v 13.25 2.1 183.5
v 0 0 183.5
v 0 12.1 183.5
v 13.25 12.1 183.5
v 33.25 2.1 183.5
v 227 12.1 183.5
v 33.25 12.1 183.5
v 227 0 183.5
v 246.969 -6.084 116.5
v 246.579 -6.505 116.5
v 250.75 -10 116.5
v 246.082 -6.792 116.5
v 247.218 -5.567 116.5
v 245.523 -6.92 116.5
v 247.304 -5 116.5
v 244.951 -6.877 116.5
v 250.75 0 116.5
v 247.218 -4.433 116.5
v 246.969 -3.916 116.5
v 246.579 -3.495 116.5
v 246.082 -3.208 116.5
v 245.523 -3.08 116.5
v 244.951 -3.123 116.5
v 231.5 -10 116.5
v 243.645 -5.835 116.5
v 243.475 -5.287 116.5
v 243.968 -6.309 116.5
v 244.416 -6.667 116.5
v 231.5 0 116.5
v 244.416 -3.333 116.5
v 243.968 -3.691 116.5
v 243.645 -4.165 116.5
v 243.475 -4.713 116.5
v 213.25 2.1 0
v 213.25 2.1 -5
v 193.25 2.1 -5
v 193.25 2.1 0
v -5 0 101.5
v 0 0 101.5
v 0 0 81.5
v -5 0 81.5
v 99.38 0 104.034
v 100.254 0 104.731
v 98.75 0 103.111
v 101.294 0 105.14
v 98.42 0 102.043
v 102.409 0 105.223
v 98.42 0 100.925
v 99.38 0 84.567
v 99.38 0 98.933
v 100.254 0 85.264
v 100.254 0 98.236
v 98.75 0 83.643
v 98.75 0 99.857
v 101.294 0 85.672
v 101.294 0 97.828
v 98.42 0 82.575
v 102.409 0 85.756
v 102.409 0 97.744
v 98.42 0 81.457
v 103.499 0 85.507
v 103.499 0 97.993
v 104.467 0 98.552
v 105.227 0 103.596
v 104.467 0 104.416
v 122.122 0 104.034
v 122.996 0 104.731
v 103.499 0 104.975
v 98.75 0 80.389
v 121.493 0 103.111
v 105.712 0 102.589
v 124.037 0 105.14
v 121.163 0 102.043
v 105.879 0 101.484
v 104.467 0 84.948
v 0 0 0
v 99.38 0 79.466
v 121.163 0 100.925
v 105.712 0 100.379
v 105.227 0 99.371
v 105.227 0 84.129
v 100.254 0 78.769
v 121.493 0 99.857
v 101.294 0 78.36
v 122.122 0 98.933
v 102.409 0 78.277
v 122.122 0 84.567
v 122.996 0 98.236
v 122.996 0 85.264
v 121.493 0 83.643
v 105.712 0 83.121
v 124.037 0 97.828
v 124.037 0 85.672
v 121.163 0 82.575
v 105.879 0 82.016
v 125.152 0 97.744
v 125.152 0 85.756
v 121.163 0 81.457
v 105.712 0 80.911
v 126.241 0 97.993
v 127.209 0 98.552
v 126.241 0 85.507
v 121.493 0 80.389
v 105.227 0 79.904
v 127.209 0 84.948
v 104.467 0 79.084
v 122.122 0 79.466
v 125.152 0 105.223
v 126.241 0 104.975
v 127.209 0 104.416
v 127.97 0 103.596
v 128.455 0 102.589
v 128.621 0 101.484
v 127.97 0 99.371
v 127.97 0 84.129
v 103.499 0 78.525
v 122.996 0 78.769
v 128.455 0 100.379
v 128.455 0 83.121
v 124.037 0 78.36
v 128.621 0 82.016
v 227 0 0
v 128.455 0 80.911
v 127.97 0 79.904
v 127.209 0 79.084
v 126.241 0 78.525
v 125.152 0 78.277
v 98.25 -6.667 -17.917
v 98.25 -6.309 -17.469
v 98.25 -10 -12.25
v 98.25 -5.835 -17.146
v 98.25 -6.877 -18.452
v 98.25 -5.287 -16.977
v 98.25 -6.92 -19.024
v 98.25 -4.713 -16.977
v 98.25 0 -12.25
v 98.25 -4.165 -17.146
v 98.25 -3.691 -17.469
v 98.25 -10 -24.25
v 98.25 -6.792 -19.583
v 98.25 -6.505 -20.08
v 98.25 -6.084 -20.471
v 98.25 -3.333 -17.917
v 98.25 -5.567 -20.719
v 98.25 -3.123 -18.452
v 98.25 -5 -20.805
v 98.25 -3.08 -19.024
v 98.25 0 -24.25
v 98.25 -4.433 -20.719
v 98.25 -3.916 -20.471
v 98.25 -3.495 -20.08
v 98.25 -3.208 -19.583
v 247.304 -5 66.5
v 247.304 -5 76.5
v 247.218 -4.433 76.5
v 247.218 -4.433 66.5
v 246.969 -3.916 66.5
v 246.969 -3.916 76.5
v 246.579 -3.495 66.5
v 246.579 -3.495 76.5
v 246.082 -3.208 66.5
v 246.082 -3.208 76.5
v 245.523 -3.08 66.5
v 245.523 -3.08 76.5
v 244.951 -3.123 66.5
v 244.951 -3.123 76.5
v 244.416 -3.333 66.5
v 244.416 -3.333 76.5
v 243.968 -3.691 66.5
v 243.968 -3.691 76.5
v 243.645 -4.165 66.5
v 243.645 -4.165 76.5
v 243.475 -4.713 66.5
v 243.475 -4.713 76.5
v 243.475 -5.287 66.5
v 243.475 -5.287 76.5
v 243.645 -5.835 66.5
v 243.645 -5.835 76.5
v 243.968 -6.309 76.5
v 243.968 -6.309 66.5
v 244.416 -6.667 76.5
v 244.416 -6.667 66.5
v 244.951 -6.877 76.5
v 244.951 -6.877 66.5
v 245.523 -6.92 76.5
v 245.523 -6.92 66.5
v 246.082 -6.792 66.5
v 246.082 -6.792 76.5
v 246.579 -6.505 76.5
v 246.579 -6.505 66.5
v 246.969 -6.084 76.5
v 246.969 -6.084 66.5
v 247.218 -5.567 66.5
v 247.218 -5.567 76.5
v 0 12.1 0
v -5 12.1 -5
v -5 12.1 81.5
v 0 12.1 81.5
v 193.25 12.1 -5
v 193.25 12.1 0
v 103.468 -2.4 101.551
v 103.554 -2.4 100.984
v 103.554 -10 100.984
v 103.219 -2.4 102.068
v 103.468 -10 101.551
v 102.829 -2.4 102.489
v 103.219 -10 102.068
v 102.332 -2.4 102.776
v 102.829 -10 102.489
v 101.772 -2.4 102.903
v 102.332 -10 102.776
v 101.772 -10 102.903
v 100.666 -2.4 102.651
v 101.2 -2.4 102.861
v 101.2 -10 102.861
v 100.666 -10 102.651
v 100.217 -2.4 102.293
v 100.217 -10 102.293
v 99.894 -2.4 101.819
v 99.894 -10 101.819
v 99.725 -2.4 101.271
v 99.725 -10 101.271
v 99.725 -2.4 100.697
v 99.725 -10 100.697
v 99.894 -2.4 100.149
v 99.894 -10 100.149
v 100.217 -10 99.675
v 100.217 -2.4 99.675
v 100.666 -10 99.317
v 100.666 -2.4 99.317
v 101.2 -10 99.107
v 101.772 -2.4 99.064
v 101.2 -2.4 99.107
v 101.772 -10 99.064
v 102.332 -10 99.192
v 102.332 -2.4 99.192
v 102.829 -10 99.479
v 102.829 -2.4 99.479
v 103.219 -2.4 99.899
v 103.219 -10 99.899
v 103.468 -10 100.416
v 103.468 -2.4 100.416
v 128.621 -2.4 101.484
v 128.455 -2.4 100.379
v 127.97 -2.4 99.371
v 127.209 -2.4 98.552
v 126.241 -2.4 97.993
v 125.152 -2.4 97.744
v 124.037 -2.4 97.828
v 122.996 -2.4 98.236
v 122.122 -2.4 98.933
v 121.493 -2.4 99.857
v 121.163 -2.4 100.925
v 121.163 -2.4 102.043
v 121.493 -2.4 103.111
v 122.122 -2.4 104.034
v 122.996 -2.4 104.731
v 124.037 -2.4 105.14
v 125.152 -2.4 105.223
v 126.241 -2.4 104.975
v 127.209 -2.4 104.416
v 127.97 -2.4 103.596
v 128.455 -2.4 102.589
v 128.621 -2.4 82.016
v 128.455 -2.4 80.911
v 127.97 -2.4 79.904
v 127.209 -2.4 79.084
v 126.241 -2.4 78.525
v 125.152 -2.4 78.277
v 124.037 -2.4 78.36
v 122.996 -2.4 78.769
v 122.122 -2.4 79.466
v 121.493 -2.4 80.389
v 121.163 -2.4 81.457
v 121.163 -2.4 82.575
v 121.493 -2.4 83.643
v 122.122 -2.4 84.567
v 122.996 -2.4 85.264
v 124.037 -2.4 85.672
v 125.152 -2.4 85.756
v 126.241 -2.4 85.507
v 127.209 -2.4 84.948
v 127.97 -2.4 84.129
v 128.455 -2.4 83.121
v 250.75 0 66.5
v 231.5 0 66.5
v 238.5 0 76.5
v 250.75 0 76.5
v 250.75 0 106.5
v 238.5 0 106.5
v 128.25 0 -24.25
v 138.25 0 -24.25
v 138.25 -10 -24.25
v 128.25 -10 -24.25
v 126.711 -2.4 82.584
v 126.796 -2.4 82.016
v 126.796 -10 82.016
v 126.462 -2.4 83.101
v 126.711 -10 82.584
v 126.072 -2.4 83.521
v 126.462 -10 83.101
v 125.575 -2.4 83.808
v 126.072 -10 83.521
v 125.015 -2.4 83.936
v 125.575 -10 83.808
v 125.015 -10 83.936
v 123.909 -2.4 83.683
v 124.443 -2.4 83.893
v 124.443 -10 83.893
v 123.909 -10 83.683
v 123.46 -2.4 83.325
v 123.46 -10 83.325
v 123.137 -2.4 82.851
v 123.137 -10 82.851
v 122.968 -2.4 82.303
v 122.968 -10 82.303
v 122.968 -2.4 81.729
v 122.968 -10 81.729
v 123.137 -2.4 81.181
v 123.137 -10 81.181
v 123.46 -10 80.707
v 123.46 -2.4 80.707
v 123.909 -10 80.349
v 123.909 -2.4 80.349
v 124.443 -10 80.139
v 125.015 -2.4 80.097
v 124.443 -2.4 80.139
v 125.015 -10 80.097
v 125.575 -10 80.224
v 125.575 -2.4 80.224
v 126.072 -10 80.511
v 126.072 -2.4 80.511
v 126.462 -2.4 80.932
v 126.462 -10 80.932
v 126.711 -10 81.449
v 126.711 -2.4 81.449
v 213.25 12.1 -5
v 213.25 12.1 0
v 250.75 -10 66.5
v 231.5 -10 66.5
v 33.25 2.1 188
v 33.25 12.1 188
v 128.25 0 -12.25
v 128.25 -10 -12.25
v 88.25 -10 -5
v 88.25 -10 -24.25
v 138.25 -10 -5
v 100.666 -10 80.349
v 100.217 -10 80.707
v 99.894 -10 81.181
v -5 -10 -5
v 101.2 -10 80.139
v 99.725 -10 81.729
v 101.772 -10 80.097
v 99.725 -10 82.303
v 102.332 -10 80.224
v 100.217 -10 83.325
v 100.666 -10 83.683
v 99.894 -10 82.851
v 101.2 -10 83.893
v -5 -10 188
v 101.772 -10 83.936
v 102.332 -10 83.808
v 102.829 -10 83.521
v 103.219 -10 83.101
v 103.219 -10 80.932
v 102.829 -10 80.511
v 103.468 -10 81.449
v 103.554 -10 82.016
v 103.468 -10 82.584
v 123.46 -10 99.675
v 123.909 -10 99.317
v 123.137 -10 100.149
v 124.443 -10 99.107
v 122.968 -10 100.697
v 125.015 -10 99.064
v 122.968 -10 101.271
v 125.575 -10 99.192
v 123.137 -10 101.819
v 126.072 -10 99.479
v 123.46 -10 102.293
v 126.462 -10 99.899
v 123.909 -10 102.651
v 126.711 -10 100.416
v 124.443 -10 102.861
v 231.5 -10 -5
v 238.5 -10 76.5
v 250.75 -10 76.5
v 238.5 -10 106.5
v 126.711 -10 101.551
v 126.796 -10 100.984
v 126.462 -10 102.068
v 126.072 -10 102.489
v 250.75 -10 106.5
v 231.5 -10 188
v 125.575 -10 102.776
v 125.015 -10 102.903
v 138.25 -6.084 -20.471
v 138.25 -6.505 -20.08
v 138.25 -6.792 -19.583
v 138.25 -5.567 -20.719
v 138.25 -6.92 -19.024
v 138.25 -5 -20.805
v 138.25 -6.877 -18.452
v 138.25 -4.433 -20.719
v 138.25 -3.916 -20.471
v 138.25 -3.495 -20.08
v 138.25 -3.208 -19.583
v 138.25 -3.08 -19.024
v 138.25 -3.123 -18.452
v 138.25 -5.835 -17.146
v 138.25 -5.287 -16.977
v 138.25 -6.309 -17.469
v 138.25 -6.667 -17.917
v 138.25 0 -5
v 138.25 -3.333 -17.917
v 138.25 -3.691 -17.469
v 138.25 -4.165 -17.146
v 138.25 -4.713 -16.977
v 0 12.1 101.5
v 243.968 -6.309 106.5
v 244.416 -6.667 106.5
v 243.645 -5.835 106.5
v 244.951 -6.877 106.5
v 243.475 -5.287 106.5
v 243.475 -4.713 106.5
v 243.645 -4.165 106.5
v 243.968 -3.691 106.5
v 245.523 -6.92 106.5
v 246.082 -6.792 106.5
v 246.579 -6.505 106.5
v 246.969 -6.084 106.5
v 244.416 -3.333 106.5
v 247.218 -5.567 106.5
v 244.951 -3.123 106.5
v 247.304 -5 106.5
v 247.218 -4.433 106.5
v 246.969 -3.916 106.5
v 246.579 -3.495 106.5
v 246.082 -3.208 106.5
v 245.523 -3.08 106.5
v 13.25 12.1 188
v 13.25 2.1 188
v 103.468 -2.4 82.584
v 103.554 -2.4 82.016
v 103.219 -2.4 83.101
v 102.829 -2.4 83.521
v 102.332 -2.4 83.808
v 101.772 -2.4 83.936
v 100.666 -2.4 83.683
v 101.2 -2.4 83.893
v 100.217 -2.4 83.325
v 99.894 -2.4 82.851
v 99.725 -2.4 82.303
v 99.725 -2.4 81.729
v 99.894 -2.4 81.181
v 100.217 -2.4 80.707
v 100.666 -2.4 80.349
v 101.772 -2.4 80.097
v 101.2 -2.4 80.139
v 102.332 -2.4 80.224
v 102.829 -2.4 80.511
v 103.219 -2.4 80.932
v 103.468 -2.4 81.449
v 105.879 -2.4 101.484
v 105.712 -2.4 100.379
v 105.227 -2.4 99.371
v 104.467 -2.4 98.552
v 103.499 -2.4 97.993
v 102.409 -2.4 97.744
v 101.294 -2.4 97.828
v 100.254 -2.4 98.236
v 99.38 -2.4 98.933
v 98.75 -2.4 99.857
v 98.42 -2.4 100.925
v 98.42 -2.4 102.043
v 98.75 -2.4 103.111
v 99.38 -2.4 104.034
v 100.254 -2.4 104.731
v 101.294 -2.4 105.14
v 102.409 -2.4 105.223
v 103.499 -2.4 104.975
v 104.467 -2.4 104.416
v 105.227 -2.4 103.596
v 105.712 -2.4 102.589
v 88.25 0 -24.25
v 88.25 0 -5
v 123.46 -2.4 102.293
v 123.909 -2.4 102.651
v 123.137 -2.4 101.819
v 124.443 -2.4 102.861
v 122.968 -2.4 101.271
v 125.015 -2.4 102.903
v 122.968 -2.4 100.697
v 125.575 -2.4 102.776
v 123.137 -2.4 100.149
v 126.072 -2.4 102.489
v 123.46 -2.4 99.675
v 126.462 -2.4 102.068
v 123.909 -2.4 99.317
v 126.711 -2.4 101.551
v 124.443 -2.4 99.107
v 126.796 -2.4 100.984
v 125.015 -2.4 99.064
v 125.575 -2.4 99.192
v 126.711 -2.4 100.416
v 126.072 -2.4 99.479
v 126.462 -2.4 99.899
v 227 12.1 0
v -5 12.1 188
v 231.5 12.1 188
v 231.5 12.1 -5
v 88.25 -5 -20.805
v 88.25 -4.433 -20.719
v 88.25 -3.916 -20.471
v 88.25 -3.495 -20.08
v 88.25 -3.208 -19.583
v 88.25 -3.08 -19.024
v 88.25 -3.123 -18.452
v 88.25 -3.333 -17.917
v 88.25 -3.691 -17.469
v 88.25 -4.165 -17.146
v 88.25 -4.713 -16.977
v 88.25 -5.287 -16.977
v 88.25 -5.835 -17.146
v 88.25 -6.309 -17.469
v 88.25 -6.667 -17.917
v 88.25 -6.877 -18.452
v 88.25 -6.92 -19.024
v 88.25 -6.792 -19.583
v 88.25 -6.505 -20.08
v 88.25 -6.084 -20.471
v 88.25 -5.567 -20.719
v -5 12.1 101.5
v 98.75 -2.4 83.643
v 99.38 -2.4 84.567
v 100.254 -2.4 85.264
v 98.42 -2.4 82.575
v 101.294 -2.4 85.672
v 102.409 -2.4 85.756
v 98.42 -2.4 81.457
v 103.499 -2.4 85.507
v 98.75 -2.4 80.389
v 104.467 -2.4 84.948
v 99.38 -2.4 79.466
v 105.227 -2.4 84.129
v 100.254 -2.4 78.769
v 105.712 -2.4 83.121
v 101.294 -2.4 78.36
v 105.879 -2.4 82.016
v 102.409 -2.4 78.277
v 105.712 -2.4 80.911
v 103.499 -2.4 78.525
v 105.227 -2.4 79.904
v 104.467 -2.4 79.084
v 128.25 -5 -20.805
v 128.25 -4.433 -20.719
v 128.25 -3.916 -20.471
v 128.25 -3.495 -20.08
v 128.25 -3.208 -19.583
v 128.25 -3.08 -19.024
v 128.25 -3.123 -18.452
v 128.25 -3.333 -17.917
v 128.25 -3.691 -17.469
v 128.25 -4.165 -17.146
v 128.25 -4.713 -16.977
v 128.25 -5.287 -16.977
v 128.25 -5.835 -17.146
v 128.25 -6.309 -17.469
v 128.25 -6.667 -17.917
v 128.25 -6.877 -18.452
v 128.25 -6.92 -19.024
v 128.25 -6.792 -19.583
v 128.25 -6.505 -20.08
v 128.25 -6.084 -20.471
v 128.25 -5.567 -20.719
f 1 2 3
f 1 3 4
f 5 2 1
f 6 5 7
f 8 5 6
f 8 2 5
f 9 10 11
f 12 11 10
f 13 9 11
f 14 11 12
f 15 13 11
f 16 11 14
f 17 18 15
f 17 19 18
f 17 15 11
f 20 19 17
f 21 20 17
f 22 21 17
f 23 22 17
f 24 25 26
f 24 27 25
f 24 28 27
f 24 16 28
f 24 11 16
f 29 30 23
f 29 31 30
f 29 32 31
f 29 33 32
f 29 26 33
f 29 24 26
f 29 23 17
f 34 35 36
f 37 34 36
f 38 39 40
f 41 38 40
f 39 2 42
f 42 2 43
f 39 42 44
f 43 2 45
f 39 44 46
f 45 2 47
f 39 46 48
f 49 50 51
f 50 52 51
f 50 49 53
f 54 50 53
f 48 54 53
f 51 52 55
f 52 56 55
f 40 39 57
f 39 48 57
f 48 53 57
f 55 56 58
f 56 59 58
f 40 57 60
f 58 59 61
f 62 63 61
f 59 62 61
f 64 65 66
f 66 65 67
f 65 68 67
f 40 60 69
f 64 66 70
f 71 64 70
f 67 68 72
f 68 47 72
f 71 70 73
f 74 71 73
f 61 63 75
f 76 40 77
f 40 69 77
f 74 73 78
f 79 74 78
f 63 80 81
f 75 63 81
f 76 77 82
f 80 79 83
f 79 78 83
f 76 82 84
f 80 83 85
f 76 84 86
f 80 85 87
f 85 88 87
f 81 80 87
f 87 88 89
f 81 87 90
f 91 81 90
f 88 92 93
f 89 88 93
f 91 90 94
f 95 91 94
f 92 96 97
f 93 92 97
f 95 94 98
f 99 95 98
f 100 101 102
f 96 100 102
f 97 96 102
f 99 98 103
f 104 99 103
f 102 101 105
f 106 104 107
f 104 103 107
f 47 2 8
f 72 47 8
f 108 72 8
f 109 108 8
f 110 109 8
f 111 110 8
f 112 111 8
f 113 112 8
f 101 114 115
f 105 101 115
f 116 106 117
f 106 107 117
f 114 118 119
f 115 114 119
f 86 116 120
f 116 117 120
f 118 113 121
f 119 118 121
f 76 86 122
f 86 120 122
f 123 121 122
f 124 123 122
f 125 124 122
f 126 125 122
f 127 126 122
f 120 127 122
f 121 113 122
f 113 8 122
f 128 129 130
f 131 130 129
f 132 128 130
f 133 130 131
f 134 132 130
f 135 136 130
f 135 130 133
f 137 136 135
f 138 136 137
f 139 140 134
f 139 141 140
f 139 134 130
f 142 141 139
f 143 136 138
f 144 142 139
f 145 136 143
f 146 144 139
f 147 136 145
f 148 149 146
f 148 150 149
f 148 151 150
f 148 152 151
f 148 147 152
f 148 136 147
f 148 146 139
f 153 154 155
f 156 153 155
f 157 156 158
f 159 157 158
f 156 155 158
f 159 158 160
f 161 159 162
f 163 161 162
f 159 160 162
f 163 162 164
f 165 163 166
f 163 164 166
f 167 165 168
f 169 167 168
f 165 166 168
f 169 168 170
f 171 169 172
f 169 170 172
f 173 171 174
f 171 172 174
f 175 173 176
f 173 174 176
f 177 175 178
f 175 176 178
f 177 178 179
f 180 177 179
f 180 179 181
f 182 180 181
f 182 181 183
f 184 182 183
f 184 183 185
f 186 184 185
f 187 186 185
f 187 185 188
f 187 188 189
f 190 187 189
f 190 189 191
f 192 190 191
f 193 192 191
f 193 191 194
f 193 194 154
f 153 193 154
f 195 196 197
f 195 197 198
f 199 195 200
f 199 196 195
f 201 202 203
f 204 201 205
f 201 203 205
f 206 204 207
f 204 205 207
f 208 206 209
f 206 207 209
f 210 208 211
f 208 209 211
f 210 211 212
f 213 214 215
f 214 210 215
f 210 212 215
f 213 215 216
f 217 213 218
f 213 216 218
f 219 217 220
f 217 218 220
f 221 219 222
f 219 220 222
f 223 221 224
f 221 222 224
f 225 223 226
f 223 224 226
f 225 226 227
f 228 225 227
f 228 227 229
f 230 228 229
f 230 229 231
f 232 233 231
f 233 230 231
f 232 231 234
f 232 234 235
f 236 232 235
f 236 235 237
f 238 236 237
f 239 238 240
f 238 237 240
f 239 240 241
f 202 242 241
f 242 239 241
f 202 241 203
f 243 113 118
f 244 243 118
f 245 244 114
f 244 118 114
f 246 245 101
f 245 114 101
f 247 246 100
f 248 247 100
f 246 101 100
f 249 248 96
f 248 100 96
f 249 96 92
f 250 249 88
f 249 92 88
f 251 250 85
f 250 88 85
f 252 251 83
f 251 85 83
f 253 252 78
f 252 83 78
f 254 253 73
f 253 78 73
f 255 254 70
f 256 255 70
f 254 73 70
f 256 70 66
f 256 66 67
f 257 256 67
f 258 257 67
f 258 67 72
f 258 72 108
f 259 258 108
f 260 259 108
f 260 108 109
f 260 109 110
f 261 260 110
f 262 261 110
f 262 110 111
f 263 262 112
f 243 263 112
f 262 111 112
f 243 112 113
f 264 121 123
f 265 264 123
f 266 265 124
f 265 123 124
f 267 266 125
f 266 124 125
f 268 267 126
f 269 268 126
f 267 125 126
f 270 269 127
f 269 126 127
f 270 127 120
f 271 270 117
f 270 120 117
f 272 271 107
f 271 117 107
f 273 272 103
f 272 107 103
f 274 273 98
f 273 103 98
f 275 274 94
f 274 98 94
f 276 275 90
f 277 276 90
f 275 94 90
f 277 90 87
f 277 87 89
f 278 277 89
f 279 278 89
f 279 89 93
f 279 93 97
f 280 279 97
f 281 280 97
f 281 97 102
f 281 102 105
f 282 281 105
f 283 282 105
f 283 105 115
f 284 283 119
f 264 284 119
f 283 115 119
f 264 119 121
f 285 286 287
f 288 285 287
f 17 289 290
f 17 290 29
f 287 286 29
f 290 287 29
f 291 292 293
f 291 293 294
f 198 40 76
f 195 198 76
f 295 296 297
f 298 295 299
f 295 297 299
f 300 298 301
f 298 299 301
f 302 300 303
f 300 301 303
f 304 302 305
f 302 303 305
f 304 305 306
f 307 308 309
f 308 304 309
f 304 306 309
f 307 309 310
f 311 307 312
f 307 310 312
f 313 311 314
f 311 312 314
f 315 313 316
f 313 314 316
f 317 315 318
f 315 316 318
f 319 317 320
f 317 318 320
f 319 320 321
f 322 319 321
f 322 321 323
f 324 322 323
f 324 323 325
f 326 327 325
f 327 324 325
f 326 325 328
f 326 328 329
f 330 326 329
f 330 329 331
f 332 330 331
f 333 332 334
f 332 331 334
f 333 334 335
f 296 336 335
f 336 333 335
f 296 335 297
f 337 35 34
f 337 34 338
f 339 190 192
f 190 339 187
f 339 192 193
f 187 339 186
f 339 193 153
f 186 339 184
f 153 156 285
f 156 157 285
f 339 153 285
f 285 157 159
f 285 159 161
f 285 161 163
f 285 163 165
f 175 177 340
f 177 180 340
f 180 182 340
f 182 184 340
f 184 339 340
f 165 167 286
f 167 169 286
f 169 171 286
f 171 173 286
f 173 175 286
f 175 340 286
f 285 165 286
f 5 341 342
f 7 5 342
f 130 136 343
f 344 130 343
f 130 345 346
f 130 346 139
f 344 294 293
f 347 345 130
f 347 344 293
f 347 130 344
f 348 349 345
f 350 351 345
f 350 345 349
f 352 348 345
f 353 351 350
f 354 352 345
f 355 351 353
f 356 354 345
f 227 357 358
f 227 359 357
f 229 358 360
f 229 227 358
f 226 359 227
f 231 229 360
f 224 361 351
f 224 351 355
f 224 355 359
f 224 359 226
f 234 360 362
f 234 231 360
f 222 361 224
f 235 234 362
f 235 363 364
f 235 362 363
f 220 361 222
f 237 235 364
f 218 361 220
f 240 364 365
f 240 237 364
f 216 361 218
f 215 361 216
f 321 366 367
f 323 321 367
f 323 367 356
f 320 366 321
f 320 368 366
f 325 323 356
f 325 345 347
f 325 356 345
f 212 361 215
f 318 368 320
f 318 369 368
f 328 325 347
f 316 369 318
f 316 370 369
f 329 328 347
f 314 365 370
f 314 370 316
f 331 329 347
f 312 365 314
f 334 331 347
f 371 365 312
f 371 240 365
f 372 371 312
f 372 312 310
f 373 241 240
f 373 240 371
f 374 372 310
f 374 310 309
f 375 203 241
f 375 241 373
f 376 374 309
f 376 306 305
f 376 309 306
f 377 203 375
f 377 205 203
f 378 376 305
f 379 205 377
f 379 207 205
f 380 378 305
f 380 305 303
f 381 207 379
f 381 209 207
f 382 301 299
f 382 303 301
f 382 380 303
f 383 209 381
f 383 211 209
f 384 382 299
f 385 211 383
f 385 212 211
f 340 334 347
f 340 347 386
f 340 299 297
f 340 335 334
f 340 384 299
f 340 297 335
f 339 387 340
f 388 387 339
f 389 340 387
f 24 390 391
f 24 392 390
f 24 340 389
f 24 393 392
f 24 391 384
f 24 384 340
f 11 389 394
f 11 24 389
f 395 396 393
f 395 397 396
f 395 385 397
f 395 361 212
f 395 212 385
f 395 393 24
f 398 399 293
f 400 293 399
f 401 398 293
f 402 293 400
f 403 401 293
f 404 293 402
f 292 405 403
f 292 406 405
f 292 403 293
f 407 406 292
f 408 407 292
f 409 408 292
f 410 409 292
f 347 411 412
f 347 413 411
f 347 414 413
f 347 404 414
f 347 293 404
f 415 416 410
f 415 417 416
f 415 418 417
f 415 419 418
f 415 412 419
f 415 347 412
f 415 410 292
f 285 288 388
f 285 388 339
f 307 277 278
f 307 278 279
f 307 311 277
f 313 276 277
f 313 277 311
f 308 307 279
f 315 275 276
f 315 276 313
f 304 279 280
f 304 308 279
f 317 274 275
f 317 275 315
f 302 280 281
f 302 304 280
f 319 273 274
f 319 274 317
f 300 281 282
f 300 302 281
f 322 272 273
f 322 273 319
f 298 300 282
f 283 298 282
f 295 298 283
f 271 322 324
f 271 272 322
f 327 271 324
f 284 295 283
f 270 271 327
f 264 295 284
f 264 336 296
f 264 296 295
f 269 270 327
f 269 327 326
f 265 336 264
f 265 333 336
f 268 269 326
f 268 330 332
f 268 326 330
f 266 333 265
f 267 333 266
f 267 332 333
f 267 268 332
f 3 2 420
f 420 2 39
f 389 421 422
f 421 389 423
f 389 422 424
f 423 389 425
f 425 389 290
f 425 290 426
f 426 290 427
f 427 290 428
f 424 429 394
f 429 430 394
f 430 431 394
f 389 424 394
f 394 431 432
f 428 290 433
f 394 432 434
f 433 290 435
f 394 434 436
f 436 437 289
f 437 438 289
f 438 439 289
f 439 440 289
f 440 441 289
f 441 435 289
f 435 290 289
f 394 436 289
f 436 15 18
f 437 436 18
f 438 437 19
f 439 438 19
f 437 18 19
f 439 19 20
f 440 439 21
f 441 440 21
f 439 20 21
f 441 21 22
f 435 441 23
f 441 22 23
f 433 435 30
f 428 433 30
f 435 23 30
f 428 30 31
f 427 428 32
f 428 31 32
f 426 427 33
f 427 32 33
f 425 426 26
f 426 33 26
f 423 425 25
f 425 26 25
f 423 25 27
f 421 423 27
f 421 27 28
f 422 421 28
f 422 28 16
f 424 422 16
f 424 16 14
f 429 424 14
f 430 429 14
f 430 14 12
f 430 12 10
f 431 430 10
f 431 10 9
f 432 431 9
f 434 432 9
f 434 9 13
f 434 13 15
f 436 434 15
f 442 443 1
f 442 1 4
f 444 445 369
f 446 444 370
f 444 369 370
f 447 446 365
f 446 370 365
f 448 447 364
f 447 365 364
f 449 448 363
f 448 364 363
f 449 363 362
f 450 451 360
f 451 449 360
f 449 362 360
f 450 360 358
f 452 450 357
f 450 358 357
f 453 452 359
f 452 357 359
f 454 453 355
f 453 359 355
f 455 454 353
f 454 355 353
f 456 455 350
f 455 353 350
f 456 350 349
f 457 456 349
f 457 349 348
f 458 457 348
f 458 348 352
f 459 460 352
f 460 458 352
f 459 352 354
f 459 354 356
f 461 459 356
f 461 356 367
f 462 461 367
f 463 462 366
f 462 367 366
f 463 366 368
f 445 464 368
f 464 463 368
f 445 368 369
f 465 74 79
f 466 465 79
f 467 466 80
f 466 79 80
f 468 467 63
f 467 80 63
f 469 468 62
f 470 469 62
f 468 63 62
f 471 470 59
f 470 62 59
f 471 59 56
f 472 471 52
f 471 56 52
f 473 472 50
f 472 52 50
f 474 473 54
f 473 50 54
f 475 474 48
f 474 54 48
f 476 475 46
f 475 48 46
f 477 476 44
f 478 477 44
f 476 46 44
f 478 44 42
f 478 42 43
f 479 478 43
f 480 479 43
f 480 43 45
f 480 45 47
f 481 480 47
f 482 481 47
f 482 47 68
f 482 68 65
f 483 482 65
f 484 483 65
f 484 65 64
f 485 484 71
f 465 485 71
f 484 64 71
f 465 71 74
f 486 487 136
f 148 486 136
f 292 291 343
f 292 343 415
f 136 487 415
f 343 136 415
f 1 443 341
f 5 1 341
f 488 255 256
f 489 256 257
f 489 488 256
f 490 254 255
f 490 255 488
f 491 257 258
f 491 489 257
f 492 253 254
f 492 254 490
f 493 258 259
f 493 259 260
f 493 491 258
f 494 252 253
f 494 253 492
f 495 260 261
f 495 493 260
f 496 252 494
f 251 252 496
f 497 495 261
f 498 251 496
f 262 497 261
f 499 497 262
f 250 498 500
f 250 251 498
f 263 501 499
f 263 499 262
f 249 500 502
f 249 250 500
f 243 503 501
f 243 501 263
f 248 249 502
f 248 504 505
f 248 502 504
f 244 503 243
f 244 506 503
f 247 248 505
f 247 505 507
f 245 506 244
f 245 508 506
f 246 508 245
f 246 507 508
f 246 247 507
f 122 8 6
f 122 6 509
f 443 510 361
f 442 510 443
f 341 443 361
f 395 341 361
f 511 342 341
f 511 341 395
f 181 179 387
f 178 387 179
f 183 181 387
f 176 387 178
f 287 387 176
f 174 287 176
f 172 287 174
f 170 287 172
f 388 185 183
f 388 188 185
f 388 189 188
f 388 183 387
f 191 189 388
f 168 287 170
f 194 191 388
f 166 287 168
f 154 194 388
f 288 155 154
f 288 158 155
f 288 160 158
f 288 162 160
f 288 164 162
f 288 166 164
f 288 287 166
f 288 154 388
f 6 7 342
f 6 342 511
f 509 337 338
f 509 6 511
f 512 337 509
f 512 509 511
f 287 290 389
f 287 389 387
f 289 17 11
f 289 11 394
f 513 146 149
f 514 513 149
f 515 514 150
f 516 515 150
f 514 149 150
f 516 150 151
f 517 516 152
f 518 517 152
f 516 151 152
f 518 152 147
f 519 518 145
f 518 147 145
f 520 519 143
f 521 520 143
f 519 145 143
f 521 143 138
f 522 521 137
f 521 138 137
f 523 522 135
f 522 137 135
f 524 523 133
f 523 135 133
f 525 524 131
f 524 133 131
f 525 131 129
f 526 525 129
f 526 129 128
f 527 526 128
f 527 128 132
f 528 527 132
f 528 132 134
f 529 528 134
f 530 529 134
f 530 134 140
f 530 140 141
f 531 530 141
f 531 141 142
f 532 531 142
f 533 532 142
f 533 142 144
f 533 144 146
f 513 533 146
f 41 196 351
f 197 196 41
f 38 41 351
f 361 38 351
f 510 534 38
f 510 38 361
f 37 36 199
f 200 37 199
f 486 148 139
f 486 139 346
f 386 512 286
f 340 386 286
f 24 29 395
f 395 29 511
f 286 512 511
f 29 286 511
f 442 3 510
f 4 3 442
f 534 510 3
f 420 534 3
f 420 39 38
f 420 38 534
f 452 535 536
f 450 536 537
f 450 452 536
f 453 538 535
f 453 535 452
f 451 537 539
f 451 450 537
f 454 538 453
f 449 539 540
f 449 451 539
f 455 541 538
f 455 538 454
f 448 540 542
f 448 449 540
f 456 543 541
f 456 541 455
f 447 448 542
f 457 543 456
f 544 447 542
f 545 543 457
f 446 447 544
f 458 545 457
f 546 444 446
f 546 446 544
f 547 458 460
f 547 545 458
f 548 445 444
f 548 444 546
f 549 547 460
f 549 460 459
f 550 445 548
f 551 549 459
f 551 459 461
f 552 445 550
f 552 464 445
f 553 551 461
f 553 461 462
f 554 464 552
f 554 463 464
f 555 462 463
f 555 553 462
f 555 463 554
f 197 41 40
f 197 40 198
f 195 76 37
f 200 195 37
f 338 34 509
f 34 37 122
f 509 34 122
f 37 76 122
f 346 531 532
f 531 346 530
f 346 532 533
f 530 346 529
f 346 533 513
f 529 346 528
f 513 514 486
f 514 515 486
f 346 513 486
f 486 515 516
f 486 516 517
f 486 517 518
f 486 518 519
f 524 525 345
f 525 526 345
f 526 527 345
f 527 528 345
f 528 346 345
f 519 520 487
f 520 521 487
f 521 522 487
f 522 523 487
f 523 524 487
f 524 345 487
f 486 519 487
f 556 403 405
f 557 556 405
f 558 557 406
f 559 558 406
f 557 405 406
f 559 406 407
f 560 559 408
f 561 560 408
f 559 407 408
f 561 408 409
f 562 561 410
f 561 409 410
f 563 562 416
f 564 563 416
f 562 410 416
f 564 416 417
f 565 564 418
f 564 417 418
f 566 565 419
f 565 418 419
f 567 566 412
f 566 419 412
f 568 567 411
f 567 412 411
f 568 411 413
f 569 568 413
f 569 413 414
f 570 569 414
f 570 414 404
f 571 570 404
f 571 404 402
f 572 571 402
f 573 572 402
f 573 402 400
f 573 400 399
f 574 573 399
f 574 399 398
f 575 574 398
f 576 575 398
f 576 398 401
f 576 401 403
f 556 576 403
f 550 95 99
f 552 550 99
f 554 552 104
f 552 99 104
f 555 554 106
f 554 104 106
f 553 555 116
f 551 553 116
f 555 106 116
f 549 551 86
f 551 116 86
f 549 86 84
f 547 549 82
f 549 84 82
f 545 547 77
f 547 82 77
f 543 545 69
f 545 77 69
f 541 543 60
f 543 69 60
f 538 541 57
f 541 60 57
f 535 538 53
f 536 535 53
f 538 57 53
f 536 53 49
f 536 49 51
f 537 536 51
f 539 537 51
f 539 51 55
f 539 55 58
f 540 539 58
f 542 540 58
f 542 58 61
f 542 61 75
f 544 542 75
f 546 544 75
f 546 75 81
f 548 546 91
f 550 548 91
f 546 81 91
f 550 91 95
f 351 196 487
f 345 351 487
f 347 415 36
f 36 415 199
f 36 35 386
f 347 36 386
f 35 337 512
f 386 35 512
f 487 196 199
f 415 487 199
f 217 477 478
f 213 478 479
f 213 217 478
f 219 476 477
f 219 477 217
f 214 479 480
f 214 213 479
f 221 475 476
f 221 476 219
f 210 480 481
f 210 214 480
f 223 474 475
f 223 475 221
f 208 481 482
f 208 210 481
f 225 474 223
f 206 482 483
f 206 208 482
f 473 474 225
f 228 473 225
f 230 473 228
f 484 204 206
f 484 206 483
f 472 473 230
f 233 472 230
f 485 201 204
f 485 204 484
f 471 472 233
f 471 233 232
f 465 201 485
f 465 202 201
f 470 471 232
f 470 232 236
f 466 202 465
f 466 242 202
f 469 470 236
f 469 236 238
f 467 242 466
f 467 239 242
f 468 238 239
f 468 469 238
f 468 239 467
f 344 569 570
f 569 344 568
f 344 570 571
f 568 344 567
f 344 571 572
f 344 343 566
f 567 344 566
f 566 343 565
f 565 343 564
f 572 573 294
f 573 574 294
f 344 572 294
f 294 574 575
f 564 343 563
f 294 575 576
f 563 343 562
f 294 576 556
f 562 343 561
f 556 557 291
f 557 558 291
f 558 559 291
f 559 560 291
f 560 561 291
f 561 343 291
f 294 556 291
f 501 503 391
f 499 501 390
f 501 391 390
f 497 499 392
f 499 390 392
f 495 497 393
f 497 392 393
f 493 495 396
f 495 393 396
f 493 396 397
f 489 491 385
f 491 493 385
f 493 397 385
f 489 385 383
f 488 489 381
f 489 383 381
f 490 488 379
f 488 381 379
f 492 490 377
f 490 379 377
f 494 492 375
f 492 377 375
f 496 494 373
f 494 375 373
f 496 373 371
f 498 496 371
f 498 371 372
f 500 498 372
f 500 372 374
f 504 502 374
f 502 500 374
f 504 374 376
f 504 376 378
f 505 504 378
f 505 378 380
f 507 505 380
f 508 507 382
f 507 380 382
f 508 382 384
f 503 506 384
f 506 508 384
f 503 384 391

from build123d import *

# Parameters (mm, degrees)
SKETCH2_W           = 236.5
SKETCH2_H           = 193
SKETCH2_W_2         = 227
SKETCH2_H_2         = 183.5
BOSS_EXTRUDE1_DEPTH = 12.1
SKETCH3_W           = 236.5
SKETCH3_H           = 193
BOSS_EXTRUDE2_DEPTH = 10
SKETCH4_W           = 10
SKETCH4_H           = 10
CUT_EXTRUDE1_DEPTH  = 5
SKETCH7_W           = 20
SKETCH7_H           = 10
CUT_EXTRUDE2_DEPTH  = 5
SKETCH8_W           = 20
SKETCH8_H           = 10
CUT_EXTRUDE3_DEPTH  = 5
SKETCH14_W          = 25
SKETCH14_H          = 10
BOSS_EXTRUDE6_DEPTH = 19.25
SKETCH18_W          = 12.25
SKETCH18_H          = 30
CUT_EXTRUDE7_DEPTH  = 11
SKETCH19_R          = 1.925
CUT_EXTRUDE8_DEPTH  = 122.5
SKETCH21_R          = 1.925
CUT_EXTRUDE9_DEPTH  = 23.1
SKETCH22_R          = 3.75
SKETCH22_R_2        = 1.925
CUT_EXTRUDE10_DEPTH = 2.4
SKETCH27_W          = 25
SKETCH27_H          = 10
BOSS_EXTRUDE7_DEPTH = 19.25
SKETCH28_W          = 30
SKETCH28_H          = 12
CUT_EXTRUDE11_DEPTH = 19.25
SKETCH31_R          = 1.925
CUT_EXTRUDE12_DEPTH = 144.25
SKETCH32_W          = 20
SKETCH32_H          = 12.1
CUT_EXTRUDE14_DEPTH = 6


with BuildPart() as part:
    # Sketch2 → Boss-Extrude1 (new body)
    with BuildSketch(Plane(origin=(0, 0, 0), x_dir=(1, 0, 0), z_dir=(0, 1, 0))):
        with Locations((113.25, -91.5)):
            Rectangle(SKETCH2_W, SKETCH2_H)
        with Locations((113.5, -91.75)):
            Rectangle(SKETCH2_W_2, SKETCH2_H_2, mode=Mode.SUBTRACT)
    extrude(amount=BOSS_EXTRUDE1_DEPTH)

    # Sketch3 → Boss-Extrude2 (add)
    with BuildSketch(Plane.XZ):
        with Locations((113.25, 91.5)):
            Rectangle(SKETCH3_W, SKETCH3_H)
    extrude(amount=BOSS_EXTRUDE2_DEPTH)

    # Sketch4 → Cut-Extrude1 (cut)
    with BuildSketch(Plane.ZY.offset(5)):
        with Locations((96.5, 7.1)):
            Rectangle(SKETCH4_W, SKETCH4_H)
        with Locations((86.5, 7.1)):
            Rectangle(SKETCH4_W, SKETCH4_H)
    extrude(amount=-CUT_EXTRUDE1_DEPTH, mode=Mode.SUBTRACT)

    # Sketch7 → Cut-Extrude2 (cut)
    with BuildSketch(Plane.XY.offset(188)):
        with Locations((23.25, 7.1)):
            Rectangle(SKETCH7_W, SKETCH7_H)
    extrude(amount=-CUT_EXTRUDE2_DEPTH, mode=Mode.SUBTRACT)

    # Sketch8 → Cut-Extrude3 (cut)
    with BuildSketch(Plane(origin=(0, 0, -5), x_dir=(-1, 0, 0), z_dir=(0, 0, -1))):
        with Locations((-203.25, 7.1)):
            Rectangle(SKETCH8_W, SKETCH8_H)
    extrude(amount=-CUT_EXTRUDE3_DEPTH, mode=Mode.SUBTRACT)

    # Sketch14 → Boss-Extrude6 (add)
    with BuildSketch(Plane(origin=(231.5, 0, 0), x_dir=(0, 0, -1), z_dir=(1, 0, 0))):
        with Locations((-104, -5)):
            Rectangle(SKETCH14_W, SKETCH14_H)
        with Locations((-79, -5)):
            Rectangle(SKETCH14_W, SKETCH14_H)
    extrude(amount=BOSS_EXTRUDE6_DEPTH)

    # Sketch18 → Cut-Extrude7 (cut, through all)
    with BuildSketch(Plane(origin=(0, 0, 0), x_dir=(1, 0, 0), z_dir=(0, 1, 0))):
        with Locations((244.625, -91.5)):
            Rectangle(SKETCH18_W, SKETCH18_H)
    extrude(amount=-CUT_EXTRUDE7_DEPTH, mode=Mode.SUBTRACT)

    # Sketch19 → Cut-Extrude8 (cut, through all)
    with BuildSketch(Plane.XY.offset(116.5)):
        with Locations((245.378954084, -5)):
            Circle(SKETCH19_R)
    extrude(amount=-CUT_EXTRUDE8_DEPTH, mode=Mode.SUBTRACT)

    # Sketch21 → Cut-Extrude9 (cut, through all)
    with BuildSketch(Plane.XZ.offset(10)):
        with Locations((124.871391666, 82.016158176)):
            Circle(SKETCH21_R)
        with Locations((124.871391666, 100.983841824)):
            Circle(SKETCH21_R)
        with Locations((101.628608334, 100.983841824)):
            Circle(SKETCH21_R)
        with Locations((101.628608334, 82.016158176)):
            Circle(SKETCH21_R)
    extrude(amount=-CUT_EXTRUDE9_DEPTH, mode=Mode.SUBTRACT)

    # Sketch22 → Cut-Extrude10 (cut)
    with BuildSketch(Plane(origin=(0, 0, 0), x_dir=(1, 0, 0), z_dir=(0, 1, 0))):
        with Locations((102.128608334, -82.016158176)):
            Circle(SKETCH22_R)
        with Locations((101.628608334, -82.016158176)):
            Circle(SKETCH22_R_2, mode=Mode.SUBTRACT)
        with Locations((124.871391666, -82.016158176)):
            Circle(SKETCH22_R)
        with Locations((124.871391666, -82.016158176)):
            Circle(SKETCH22_R_2, mode=Mode.SUBTRACT)
        with Locations((124.871391666, -101.483841824)):
            Circle(SKETCH22_R)
        with Locations((124.871391666, -100.983841824)):
            Circle(SKETCH22_R_2, mode=Mode.SUBTRACT)
        with Locations((102.128608334, -101.483841824)):
            Circle(SKETCH22_R)
        with Locations((101.628608334, -100.983841824)):
            Circle(SKETCH22_R_2, mode=Mode.SUBTRACT)
    extrude(amount=-CUT_EXTRUDE10_DEPTH, mode=Mode.SUBTRACT)

    # Sketch27 → Boss-Extrude7 (add)
    with BuildSketch(Plane(origin=(0, 0, -5), x_dir=(-1, 0, 0), z_dir=(0, 0, -1))):
        with Locations((-125.75, -5)):
            Rectangle(SKETCH27_W, SKETCH27_H)
        with Locations((-100.75, -5)):
            Rectangle(SKETCH27_W, SKETCH27_H)
    extrude(amount=BOSS_EXTRUDE7_DEPTH)

    # Sketch28 → Cut-Extrude11 (cut)
    with BuildSketch(Plane(origin=(0, 0, 0), x_dir=(1, 0, 0), z_dir=(0, 1, 0))):
        with Locations((113.25, 18.25)):
            Rectangle(SKETCH28_W, SKETCH28_H)
    extrude(amount=-CUT_EXTRUDE11_DEPTH, mode=Mode.SUBTRACT)

    # Sketch31 → Cut-Extrude12 (cut, through all)
    with BuildSketch(Plane(origin=(138.25, 0, 0), x_dir=(0, 0, -1), z_dir=(1, 0, 0))):
        with Locations((18.88, -5)):
            Circle(SKETCH31_R)
    extrude(amount=-CUT_EXTRUDE12_DEPTH, mode=Mode.SUBTRACT)

    # Sketch32 → Cut-Extrude14 (cut, through all)
    with BuildSketch(Plane(origin=(0, 0, 0), x_dir=(0, 0, -1), z_dir=(1, 0, 0))):
        with Locations((-91.5, 6.05)):
            Rectangle(SKETCH32_W, SKETCH32_H)
    extrude(amount=-CUT_EXTRUDE14_DEPTH, mode=Mode.SUBTRACT)


solid = part.part
